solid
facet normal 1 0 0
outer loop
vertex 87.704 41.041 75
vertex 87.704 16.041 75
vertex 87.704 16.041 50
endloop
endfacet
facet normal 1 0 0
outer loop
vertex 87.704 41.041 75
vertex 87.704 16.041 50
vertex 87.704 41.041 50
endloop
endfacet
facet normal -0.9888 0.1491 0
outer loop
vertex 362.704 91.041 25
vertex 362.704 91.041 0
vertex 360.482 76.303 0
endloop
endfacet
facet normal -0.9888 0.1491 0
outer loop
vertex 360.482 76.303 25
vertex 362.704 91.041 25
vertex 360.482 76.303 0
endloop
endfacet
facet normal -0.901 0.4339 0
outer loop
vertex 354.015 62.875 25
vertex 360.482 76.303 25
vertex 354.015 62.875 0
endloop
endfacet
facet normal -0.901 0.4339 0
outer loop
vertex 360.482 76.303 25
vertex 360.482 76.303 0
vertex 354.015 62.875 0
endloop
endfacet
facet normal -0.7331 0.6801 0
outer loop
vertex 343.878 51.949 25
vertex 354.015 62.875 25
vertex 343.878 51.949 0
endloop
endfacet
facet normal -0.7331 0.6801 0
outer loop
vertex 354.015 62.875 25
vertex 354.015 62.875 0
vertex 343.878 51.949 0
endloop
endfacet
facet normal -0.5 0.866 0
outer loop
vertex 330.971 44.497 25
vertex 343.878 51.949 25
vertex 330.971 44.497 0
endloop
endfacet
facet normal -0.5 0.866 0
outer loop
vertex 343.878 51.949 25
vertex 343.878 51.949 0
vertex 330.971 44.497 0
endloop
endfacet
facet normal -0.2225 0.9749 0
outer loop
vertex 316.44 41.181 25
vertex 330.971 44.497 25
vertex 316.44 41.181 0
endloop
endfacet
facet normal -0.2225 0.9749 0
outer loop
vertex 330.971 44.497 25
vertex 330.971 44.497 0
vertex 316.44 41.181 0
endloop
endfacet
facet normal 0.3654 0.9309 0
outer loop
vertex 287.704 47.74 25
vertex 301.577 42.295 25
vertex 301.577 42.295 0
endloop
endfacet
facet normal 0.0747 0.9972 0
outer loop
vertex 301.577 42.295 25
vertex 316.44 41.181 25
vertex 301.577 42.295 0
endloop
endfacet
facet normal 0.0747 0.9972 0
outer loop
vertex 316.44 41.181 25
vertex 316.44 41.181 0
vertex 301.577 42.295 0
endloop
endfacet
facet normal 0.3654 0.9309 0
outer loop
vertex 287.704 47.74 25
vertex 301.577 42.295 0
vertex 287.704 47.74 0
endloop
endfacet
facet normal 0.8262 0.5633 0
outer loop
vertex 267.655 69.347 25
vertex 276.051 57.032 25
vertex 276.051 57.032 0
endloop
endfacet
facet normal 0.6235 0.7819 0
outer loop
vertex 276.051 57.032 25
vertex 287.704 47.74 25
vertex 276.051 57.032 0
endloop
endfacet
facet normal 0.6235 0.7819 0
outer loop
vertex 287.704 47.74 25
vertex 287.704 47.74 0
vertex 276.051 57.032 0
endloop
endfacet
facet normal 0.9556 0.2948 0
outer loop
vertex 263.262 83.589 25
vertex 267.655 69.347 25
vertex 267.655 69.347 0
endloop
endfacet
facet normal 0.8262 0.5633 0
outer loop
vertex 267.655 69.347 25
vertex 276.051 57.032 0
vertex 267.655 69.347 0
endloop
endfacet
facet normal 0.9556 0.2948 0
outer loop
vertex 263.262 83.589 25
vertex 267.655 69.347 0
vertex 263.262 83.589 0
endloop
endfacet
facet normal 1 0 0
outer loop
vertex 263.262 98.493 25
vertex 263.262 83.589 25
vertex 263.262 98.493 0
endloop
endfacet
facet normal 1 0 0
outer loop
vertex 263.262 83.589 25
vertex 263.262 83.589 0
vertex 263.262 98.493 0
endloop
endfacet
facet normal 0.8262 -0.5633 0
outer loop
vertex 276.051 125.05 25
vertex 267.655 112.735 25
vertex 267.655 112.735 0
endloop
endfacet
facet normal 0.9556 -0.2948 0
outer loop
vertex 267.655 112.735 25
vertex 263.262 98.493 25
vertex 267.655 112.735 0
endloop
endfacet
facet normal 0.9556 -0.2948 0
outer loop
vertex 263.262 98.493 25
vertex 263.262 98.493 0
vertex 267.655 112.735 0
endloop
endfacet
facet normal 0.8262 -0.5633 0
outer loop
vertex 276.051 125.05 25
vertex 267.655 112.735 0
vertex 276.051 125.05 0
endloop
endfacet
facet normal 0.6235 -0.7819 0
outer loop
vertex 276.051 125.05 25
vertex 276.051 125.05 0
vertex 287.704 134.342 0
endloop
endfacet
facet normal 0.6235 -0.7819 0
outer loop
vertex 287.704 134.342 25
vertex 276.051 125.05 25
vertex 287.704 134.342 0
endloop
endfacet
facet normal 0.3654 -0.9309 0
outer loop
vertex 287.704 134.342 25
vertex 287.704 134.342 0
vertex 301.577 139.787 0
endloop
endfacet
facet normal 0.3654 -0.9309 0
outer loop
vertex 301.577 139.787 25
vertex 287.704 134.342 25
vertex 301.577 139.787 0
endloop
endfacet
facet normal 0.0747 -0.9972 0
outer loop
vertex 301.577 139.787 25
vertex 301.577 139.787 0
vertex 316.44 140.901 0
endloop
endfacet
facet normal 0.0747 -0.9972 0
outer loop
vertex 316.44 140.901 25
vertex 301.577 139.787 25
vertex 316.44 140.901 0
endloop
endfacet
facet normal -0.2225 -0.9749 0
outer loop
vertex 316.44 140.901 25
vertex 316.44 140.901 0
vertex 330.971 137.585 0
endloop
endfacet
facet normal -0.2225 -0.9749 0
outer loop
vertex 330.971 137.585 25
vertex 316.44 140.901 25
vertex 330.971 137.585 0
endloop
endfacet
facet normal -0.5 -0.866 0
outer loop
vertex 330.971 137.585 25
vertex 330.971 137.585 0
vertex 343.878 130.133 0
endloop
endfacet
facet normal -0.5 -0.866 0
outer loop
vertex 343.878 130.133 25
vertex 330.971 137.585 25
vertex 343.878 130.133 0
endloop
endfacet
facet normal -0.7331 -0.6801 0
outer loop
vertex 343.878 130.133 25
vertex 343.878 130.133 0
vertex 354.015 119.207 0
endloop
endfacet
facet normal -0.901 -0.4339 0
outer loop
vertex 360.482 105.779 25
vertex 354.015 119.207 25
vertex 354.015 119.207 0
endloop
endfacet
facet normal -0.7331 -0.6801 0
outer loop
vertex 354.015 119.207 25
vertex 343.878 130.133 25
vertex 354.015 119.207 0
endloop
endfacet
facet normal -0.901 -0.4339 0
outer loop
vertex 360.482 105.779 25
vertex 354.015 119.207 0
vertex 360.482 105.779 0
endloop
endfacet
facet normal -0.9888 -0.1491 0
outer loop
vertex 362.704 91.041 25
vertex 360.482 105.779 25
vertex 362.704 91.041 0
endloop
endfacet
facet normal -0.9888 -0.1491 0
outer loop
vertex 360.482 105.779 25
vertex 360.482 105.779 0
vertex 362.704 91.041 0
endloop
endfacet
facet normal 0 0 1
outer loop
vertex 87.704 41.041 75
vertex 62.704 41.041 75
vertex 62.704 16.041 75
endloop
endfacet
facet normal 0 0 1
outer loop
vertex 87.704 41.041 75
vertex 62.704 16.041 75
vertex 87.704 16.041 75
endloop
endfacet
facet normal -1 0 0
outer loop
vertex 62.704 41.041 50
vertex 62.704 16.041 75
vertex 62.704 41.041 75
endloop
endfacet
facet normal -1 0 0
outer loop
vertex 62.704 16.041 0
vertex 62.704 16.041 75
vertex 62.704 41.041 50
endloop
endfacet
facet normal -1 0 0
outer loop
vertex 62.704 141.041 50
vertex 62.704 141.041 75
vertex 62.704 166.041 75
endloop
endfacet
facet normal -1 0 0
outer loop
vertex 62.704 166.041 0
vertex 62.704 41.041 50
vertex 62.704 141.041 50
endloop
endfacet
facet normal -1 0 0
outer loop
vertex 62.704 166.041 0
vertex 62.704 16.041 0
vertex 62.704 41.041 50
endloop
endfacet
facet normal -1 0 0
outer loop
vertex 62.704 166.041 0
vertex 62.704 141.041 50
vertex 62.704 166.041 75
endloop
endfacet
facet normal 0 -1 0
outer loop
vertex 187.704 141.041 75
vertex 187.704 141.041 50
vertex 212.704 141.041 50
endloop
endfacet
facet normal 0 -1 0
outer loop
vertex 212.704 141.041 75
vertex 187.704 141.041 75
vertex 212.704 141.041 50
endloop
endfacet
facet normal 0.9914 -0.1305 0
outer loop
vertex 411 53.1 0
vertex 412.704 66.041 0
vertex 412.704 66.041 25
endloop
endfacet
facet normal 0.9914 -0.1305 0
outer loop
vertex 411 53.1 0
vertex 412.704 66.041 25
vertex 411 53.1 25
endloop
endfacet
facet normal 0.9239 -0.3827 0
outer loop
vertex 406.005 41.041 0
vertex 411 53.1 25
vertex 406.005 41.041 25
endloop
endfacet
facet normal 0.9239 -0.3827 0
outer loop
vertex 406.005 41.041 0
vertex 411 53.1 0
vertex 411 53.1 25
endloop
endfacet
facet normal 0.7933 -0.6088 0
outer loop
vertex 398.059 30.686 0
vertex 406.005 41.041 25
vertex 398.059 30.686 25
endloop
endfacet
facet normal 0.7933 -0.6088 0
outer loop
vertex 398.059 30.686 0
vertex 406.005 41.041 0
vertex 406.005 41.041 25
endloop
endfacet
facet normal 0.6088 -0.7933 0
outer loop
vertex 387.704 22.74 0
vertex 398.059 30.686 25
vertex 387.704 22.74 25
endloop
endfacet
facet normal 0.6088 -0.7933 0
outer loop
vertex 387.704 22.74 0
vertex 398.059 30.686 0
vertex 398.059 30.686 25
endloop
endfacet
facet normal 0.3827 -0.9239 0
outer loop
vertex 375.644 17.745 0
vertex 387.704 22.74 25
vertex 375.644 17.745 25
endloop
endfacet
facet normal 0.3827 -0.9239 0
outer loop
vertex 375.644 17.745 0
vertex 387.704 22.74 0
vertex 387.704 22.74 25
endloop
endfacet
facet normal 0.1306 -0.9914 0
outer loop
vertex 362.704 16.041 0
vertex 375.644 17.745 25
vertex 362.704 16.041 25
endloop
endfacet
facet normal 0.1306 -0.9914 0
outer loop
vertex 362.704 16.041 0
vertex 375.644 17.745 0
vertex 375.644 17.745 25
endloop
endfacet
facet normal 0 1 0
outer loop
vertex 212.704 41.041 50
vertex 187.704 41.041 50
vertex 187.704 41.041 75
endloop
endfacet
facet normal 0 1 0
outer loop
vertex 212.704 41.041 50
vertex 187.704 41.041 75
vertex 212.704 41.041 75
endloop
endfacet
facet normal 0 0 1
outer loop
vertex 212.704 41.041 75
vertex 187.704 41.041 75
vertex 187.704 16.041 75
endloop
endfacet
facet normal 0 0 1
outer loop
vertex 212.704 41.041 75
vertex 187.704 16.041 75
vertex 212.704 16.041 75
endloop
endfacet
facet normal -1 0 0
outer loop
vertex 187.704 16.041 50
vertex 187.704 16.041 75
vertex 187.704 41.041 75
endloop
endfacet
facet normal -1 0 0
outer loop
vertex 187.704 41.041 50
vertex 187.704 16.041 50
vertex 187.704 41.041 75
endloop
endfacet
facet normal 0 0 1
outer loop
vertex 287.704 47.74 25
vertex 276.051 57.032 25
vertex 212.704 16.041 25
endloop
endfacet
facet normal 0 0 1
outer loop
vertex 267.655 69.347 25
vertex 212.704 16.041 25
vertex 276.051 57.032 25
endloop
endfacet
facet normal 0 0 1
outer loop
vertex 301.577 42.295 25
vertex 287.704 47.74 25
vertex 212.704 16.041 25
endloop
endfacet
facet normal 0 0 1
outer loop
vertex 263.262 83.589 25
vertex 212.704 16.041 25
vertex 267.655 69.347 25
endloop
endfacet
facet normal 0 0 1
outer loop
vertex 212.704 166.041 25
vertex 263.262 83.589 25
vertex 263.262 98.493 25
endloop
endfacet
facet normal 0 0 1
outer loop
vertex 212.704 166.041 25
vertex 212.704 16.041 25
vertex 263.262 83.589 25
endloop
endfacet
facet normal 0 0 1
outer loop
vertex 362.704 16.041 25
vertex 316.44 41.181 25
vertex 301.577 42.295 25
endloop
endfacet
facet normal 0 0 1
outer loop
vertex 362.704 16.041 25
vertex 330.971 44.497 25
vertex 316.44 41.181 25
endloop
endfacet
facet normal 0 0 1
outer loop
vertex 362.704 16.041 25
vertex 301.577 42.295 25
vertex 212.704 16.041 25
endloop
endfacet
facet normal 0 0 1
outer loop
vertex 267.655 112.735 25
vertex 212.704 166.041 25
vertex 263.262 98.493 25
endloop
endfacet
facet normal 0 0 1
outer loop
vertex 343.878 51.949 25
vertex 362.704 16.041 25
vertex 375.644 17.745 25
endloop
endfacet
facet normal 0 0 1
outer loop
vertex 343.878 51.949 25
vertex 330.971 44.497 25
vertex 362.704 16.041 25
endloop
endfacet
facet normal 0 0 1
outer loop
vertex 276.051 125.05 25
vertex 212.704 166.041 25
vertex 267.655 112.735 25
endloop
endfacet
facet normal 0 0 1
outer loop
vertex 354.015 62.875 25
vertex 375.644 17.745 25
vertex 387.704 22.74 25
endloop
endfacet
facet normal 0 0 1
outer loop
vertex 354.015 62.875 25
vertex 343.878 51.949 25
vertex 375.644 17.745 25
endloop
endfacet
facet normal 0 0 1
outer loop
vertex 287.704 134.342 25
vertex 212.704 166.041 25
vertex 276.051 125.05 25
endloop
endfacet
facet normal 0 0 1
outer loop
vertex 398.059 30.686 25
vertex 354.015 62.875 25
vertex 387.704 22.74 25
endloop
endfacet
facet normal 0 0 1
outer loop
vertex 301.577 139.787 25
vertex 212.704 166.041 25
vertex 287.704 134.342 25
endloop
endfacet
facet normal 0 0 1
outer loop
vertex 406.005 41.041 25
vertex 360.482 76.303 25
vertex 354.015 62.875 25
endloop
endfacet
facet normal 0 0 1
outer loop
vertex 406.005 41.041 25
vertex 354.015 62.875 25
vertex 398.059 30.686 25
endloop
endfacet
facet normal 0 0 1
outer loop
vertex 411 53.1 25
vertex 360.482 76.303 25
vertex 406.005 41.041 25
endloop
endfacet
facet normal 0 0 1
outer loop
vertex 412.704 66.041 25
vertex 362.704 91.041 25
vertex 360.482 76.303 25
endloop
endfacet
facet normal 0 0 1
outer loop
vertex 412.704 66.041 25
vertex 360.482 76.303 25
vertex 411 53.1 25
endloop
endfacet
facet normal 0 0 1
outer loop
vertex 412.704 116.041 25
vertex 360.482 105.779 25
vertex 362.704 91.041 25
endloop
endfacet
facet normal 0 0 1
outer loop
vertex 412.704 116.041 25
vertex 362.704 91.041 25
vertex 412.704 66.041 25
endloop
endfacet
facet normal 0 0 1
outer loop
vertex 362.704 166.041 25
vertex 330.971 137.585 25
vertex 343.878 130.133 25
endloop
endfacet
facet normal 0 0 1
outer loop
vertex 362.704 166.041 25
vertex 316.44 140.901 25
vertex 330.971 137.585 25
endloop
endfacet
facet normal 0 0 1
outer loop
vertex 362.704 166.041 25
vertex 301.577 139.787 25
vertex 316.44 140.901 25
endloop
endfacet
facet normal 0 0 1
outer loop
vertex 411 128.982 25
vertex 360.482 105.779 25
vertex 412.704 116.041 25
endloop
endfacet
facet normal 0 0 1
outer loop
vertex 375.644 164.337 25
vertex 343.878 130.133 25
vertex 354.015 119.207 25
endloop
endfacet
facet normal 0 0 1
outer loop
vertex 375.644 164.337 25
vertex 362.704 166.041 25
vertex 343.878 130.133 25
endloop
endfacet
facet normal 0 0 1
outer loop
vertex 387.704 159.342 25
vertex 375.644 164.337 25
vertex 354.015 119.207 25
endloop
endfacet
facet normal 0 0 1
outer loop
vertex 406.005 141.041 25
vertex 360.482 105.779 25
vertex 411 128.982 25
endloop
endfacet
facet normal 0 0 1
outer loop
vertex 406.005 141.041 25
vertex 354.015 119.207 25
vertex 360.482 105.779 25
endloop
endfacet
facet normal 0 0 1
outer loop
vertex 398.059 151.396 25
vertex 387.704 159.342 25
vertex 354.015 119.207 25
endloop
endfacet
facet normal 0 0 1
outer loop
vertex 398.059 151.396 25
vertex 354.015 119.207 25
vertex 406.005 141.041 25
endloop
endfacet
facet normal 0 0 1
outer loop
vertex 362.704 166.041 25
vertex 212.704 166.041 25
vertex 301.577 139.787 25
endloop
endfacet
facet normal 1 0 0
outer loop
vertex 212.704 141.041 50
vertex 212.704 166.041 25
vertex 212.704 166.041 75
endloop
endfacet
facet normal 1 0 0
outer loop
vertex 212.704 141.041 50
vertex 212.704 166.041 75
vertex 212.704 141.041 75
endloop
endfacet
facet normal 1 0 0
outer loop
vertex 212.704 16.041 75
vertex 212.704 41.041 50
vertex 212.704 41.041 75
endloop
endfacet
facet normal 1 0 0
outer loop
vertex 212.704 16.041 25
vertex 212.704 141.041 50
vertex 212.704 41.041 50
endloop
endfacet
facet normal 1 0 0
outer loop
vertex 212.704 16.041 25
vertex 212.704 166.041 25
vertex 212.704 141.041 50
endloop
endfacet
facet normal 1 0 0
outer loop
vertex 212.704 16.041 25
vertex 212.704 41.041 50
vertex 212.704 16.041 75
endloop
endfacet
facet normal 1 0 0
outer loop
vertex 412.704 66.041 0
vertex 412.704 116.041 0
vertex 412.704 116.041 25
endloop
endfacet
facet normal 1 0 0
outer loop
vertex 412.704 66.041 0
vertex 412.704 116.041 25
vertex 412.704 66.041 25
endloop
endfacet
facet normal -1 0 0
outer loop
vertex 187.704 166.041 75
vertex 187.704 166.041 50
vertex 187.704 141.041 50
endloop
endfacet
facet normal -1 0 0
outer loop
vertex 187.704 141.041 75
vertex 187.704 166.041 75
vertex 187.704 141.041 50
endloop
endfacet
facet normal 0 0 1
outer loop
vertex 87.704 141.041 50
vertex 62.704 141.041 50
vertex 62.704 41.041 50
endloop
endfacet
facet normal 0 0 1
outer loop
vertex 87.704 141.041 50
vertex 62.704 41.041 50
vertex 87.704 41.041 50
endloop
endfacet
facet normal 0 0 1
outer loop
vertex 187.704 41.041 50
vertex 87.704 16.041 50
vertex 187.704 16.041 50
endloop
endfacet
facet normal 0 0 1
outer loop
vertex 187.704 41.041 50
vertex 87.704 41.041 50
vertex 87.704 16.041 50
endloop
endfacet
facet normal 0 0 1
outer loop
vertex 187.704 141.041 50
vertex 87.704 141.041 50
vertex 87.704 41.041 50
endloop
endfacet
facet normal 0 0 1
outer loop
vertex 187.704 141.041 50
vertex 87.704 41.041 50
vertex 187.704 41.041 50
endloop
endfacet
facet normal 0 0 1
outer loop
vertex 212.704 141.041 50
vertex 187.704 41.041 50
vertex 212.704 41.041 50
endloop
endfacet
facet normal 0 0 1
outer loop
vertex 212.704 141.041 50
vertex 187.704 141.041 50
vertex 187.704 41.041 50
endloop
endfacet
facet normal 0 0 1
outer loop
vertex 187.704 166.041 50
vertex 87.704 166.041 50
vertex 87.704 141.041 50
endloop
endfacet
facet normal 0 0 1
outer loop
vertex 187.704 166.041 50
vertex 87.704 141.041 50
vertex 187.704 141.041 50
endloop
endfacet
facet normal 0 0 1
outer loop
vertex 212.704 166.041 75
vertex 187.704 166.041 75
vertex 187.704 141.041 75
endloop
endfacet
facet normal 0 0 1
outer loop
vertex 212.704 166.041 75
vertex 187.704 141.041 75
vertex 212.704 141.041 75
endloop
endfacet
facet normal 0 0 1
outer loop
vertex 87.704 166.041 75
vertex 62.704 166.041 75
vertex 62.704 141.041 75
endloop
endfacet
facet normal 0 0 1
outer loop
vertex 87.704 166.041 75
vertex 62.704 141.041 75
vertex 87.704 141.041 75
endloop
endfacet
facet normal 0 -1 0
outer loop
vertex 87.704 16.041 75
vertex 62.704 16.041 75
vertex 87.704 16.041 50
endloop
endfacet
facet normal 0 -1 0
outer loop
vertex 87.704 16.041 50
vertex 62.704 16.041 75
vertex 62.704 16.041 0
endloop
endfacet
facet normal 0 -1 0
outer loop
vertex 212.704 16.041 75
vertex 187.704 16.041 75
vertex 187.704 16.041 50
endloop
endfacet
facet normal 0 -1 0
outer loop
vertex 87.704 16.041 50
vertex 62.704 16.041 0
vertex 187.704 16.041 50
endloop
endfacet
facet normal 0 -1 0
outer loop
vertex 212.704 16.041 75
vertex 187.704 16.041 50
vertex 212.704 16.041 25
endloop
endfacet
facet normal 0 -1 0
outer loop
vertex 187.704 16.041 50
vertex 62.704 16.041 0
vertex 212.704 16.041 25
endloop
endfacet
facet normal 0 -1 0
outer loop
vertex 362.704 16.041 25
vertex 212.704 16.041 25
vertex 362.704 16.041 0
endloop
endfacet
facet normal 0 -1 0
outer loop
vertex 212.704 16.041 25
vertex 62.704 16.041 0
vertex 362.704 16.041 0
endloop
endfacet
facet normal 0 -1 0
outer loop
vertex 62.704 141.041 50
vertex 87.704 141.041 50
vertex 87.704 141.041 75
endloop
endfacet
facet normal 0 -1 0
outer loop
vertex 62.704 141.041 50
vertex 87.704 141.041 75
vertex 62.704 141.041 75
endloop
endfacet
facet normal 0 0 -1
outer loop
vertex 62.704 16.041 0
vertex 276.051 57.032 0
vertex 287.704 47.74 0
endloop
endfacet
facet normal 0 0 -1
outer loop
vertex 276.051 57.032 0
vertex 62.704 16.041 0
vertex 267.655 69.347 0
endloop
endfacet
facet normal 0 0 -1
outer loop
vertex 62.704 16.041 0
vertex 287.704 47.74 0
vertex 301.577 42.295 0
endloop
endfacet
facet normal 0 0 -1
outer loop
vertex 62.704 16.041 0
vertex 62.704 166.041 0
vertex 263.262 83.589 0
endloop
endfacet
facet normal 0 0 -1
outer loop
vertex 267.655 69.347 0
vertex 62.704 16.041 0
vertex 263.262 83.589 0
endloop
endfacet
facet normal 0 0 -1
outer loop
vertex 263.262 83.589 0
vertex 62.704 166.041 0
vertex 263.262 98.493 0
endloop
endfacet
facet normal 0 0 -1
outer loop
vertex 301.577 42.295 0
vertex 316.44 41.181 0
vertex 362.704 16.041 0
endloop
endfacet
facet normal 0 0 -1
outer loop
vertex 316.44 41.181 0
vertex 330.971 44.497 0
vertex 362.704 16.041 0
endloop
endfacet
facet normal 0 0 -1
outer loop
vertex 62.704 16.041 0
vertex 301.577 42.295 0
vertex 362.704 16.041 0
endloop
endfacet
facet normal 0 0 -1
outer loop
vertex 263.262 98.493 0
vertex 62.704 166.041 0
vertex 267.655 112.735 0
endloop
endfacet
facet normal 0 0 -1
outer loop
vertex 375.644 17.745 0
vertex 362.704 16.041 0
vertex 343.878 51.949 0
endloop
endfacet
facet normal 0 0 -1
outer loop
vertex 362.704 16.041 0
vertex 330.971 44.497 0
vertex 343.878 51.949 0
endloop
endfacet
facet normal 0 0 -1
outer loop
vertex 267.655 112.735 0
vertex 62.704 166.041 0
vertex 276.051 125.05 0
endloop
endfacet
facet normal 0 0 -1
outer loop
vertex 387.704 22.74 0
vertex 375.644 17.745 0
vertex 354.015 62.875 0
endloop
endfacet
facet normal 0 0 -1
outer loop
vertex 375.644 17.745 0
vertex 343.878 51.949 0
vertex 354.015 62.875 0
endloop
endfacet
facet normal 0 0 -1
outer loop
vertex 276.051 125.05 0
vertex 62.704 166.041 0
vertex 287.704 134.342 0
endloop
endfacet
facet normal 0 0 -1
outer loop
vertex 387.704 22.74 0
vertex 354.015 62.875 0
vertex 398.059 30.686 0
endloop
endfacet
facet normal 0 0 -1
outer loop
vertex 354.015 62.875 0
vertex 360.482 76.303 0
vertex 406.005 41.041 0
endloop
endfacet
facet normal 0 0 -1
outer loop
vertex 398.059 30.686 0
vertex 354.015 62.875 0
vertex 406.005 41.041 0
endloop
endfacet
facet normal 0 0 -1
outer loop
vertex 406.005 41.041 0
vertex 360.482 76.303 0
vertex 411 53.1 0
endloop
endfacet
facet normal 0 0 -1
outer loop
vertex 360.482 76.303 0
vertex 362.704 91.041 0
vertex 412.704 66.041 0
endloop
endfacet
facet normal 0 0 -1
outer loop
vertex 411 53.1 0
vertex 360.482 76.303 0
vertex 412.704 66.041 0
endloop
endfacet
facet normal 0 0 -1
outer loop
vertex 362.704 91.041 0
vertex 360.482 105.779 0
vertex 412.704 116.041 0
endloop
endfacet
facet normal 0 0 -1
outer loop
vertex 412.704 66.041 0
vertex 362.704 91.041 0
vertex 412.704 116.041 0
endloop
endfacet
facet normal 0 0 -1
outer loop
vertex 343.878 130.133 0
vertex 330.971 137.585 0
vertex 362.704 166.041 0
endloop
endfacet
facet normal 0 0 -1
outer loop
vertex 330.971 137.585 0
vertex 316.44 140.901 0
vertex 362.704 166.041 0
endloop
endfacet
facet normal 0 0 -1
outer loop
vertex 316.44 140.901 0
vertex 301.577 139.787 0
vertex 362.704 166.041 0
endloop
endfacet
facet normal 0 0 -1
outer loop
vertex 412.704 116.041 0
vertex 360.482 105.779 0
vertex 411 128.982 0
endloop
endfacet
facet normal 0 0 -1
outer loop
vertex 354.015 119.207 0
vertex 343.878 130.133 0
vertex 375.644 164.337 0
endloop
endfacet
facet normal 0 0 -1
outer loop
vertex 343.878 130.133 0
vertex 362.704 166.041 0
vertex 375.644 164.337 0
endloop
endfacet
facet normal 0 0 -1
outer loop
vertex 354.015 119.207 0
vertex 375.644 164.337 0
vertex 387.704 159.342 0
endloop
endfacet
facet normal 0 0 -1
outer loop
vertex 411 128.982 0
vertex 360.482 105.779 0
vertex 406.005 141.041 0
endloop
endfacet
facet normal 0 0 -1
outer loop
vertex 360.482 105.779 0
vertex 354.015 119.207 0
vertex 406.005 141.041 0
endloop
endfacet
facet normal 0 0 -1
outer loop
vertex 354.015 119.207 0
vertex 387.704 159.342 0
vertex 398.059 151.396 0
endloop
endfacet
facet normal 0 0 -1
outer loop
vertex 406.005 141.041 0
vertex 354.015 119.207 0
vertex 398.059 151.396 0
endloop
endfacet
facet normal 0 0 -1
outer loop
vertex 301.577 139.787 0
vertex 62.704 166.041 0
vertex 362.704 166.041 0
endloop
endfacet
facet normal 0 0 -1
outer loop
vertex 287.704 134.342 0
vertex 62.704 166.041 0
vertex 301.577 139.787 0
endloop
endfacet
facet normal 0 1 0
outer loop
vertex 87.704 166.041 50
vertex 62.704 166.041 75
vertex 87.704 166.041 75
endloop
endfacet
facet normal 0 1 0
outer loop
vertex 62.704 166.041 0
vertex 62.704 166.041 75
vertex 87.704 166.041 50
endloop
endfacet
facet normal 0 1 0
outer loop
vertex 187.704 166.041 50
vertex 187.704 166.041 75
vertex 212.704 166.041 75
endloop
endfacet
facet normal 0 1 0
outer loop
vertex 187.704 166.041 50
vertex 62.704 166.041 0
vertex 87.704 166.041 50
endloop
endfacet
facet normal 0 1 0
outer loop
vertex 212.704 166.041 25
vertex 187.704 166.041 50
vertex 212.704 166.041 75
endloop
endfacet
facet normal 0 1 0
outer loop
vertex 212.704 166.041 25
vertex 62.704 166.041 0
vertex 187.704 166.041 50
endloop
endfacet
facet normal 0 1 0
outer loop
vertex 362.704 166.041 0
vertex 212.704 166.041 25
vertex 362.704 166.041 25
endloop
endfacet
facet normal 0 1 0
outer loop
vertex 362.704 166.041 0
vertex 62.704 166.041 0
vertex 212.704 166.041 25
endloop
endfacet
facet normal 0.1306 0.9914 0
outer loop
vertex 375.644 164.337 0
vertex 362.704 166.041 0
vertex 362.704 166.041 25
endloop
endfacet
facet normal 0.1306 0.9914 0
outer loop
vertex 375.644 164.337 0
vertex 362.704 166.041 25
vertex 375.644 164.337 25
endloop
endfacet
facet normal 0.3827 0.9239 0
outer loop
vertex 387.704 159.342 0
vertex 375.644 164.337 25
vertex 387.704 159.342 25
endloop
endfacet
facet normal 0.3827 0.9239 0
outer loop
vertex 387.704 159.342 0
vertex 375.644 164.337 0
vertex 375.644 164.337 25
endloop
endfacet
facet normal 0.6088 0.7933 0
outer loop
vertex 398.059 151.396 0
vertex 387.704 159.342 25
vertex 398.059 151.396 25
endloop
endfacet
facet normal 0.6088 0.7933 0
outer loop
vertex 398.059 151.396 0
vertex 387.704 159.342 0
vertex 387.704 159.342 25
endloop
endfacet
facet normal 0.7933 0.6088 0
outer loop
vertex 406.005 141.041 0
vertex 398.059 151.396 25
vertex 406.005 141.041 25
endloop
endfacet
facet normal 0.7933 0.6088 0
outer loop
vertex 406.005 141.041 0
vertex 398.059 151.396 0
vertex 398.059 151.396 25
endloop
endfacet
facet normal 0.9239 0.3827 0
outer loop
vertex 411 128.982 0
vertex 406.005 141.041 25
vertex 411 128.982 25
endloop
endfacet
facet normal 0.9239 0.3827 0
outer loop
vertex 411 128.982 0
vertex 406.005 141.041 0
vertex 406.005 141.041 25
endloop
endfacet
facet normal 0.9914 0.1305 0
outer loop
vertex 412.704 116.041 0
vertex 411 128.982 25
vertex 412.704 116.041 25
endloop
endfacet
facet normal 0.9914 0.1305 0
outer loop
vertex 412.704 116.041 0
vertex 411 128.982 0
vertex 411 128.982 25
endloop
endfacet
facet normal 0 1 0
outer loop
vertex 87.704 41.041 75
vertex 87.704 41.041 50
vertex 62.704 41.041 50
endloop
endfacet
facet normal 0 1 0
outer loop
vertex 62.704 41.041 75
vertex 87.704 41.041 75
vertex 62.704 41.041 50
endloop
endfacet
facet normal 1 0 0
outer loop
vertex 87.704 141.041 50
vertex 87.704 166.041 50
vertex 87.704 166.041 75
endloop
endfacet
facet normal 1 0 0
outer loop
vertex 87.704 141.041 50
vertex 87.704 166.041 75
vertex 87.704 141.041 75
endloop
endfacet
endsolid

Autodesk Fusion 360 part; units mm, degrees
sketch "Sketch1" plane through (0, 0, 0) normal (0, 0, 1) x (1, 0, 0)
  line L0 (62.7035, 16.041) -> (62.7035, 166.041)
  line L1 (62.7035, 16.041) -> (362.7035, 16.041)
  line L2 (62.7035, 166.041) -> (362.7035, 166.041)
  line L3 (412.7035, 116.041) -> (412.7035, 66.041)
  arc A0 (412.7035, 116.041) -> (362.7035, 166.041) centre (362.7035, 116.041) ccw
  arc A1 (362.7035, 16.041) -> (412.7035, 66.041) centre (362.7035, 66.041) ccw
  line L4 (212.7035, 166.041) -> (212.7035, 16.041)
  circle A2 centre (312.7035, 91.041) radius 50
  line L5 (62.7035, 166.041) -> (87.7035, 166.041)
  line L6 (87.7035, 166.041) -> (87.7035, 141.041)
  line L7 (87.7035, 141.041) -> (62.7035, 141.041)
  line L8 (62.7035, 141.041) -> (62.7035, 166.041)
  line L9 (212.7035, 166.041) -> (187.7035, 166.041)
  line L10 (187.7035, 166.041) -> (187.7035, 141.041)
  line L11 (187.7035, 141.041) -> (212.7035, 141.041)
  line L12 (212.7035, 141.041) -> (212.7035, 166.041)
  line L13 (62.7035, 16.041) -> (87.7035, 16.041)
  line L14 (87.7035, 16.041) -> (87.7035, 41.041)
  line L15 (87.7035, 41.041) -> (62.7035, 41.041)
  line L16 (62.7035, 41.041) -> (62.7035, 16.041)
  line L17 (212.7035, 16.041) -> (187.7035, 16.041)
  line L18 (187.7035, 16.041) -> (187.7035, 41.041)
  line L19 (187.7035, 41.041) -> (212.7035, 41.041)
  line L20 (212.7035, 41.041) -> (212.7035, 16.041)
  point P0 (412.7035, 16.041)
  point P1 (412.7035, 166.041)
  dimension "d1" = 150
  dimension "d2" = 350
  dimension "d3" = 350
  dimension "d4" = 50
  dimension "d5" = 50
  dimension "d8" = 100
  dimension "d9" = 25
  dimension "d10" = 25
  dimension "d11" = 25
  dimension "d12" = 25
  dimension "d13" = 25
  dimension "d14" = 25
  dimension "d15" = 25
  dimension "d16" = 25
extrude "Extrude1" add sketch "Sketch1" along normal blind 25 contours L1 L2 L3 A0 A1 L4 L12 L20
extrude "Extrude2" add sketch "Sketch1" along normal blind 50 contours L0 L1 L2 L4 L6 L7 L10 L11 L14 L15 L18 L19
extrude "Extrude3" add sketch "Sketch1" along normal blind 75 contours L0 L1 L13 L14 L15 L16 | L0 L2 L5 L6 L7 L8 | L1 L4 L17 L18 L19 L20 | L2 L4 L9 L10 L11 L12
